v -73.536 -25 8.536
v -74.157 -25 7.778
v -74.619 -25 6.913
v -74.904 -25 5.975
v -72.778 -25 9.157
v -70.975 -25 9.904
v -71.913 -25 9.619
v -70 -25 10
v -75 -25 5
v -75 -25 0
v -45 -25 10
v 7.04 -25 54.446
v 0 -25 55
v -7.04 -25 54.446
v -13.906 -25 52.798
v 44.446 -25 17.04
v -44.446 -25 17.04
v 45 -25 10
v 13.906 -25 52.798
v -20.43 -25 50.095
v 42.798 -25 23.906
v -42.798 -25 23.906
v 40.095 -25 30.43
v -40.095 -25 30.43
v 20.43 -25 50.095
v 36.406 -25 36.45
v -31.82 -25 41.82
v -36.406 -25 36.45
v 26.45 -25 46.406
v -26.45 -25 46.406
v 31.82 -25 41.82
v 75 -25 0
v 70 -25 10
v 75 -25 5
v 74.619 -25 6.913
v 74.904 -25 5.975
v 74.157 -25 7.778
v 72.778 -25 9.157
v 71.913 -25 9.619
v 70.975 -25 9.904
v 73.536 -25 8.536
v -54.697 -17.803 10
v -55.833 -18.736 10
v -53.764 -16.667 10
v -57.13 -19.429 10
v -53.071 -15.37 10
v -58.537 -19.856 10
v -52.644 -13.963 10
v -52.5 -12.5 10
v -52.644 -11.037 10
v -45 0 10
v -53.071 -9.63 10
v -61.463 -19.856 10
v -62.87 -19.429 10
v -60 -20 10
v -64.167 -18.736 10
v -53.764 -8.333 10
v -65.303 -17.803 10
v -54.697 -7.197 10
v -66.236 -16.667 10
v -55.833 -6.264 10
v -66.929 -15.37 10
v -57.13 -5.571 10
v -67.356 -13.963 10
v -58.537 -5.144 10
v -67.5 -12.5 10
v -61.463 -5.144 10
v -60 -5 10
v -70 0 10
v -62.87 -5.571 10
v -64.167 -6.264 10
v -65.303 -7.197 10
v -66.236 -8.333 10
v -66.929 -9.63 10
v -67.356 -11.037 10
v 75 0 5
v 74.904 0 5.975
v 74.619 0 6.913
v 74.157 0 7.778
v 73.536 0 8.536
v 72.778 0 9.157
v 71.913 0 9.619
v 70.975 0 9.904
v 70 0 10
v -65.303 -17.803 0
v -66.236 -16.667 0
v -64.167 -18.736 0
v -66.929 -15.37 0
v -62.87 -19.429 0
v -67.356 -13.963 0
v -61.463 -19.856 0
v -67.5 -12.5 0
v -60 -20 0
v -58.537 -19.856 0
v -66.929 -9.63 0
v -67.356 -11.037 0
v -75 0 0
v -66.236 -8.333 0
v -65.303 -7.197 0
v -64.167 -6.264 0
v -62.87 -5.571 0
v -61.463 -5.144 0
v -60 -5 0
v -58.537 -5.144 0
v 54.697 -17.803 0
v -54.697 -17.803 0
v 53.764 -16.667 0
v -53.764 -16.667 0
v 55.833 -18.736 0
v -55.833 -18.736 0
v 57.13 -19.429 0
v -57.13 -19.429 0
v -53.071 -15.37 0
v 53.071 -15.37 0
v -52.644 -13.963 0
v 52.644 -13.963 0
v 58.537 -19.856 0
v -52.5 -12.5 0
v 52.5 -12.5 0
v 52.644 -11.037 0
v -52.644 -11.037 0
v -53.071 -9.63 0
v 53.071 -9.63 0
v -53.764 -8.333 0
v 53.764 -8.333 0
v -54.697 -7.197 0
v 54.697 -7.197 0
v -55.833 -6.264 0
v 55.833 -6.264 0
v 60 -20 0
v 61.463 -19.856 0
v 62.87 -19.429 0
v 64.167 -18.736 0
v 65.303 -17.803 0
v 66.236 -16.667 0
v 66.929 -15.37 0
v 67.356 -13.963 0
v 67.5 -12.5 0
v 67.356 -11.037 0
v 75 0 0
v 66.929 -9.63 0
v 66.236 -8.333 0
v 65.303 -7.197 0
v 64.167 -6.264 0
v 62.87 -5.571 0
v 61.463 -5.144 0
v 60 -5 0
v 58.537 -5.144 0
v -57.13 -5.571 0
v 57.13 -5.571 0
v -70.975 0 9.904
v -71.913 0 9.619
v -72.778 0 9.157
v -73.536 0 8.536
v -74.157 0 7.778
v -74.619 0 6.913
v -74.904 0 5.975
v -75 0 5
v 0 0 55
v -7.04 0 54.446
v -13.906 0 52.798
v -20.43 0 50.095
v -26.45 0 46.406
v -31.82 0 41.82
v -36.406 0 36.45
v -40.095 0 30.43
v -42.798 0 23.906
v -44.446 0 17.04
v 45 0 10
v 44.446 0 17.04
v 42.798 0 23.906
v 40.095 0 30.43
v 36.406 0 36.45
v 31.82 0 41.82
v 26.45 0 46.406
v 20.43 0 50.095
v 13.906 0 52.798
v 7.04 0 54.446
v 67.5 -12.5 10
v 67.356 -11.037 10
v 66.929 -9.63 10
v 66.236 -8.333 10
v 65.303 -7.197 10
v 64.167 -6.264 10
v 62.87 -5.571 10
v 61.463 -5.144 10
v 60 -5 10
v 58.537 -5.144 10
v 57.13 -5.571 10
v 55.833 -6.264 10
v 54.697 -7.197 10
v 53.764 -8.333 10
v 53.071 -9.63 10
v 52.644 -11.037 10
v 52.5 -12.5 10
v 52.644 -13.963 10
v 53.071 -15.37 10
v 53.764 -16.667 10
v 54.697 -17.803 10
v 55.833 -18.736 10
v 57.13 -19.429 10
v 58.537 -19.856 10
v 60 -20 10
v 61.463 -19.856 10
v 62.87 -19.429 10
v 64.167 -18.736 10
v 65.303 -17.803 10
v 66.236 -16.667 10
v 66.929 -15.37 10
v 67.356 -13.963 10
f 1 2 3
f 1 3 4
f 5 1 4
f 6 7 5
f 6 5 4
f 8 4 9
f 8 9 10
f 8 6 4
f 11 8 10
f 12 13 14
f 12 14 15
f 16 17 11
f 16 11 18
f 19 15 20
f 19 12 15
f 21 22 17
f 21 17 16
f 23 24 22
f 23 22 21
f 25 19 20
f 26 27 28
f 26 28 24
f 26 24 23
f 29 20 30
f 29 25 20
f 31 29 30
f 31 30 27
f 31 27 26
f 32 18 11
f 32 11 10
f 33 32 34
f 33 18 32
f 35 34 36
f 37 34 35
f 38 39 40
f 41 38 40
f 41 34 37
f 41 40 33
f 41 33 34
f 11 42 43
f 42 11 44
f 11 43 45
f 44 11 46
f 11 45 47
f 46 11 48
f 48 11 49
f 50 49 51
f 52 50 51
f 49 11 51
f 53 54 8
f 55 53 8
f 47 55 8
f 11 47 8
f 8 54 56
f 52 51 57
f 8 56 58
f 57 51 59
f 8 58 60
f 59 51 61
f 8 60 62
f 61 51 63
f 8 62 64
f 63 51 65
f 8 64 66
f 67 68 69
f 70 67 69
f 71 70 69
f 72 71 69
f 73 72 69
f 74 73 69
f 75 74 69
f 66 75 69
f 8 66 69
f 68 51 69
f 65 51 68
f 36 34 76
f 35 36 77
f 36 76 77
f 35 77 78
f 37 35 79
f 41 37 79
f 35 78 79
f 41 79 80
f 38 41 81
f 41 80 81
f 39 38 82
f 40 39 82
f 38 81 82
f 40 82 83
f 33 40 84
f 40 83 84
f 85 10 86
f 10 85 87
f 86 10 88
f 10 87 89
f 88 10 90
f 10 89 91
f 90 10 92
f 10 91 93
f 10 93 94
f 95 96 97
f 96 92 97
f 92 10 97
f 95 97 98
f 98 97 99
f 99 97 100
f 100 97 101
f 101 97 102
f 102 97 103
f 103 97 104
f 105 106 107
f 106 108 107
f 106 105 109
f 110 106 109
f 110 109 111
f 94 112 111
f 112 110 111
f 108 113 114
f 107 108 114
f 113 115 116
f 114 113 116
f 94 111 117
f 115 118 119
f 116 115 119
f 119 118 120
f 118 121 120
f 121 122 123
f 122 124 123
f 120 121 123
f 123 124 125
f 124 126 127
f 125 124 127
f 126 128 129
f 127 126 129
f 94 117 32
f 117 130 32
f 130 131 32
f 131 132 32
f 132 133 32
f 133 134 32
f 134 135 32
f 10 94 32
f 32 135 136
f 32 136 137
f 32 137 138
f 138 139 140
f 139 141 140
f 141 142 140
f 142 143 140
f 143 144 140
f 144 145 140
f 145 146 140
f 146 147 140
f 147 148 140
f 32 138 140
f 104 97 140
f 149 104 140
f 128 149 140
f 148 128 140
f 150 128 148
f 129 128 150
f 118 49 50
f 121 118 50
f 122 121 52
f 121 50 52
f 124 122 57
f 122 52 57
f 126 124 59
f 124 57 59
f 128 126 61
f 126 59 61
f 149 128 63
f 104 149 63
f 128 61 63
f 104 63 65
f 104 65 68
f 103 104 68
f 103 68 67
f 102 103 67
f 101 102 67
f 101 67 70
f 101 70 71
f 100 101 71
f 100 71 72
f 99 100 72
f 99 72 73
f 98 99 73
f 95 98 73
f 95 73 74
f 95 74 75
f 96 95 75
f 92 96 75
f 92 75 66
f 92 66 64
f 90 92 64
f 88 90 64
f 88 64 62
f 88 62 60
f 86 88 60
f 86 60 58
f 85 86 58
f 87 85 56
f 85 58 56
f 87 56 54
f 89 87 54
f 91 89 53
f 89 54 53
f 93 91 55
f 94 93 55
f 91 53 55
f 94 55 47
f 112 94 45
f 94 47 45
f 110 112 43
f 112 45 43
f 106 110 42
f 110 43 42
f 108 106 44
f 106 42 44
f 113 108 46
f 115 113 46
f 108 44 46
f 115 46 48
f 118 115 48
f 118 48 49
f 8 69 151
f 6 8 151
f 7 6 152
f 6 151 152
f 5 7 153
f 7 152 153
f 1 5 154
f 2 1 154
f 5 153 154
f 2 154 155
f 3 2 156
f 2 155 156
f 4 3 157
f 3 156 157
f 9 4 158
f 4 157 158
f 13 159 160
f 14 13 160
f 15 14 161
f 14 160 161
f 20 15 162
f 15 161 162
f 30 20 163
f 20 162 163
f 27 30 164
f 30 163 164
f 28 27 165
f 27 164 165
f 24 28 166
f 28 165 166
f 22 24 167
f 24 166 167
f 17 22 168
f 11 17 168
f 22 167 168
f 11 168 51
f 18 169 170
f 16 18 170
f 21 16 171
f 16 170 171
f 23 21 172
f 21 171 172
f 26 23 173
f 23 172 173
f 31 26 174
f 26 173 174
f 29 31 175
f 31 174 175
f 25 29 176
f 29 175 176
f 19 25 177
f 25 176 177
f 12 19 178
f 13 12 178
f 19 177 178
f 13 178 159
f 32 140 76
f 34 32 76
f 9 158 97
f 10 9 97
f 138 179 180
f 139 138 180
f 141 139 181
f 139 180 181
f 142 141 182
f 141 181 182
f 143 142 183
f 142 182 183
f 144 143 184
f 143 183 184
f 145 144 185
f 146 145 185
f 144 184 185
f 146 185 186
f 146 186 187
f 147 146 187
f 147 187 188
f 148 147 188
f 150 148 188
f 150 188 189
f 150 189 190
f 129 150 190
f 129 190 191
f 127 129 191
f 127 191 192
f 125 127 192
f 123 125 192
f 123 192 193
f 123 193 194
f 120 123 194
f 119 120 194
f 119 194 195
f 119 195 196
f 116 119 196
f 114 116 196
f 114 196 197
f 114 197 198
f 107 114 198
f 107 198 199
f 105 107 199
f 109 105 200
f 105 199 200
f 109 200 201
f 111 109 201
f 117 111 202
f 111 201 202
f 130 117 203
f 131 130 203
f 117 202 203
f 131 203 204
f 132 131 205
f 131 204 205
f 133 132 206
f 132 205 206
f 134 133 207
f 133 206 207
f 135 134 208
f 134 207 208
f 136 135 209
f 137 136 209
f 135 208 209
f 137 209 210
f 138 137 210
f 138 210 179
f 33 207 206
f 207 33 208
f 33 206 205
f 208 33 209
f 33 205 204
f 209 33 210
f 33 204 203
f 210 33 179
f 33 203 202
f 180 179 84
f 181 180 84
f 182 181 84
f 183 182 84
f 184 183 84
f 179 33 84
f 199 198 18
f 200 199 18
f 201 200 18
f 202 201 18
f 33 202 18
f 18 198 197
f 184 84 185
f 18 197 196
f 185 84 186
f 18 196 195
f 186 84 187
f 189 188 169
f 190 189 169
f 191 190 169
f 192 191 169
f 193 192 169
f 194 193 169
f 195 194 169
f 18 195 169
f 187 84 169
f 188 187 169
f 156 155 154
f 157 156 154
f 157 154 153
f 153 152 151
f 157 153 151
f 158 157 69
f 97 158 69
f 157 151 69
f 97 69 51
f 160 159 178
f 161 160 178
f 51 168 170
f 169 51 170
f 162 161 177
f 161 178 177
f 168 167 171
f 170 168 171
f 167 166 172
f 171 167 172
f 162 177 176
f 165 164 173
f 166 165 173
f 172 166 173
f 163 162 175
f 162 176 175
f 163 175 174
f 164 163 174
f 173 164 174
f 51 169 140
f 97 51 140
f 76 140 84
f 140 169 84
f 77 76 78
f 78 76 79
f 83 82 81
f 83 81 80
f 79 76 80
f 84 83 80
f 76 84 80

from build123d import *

# Parameters (mm, degrees)
F1_DEPTH = 25
F2_R     = 7.5
F3_DEPTH = 10.001


with BuildPart() as f1:
    # F0 (on Front) → F1 (new body)
    with BuildSketch(Plane.XZ):
        with BuildLine():
            Line((-45, 10), (-45, 0))
            Line((-45, 0), (45, 0))
            Line((45, 0), (45, 10))
            ThreePointArc((45, 10), (31.819805, 41.819805), (0, 55))
            ThreePointArc((0, 55), (-31.819805, 41.819805), (-45, 10))
        make_face()
        with BuildLine():
            Line((-75, 5), (-75, 0))
            Line((-75, 0), (-45, 0))
            Line((-45, 0), (-45, 10))
            Line((-45, 10), (-70, 10))
            ThreePointArc((-70, 10), (-73.535534, 8.535534), (-75, 5))
        make_face()
        with BuildLine():
            Line((45, 10), (45, 0))
            Line((45, 0), (75, 0))
            Line((75, 0), (75, 5))
            ThreePointArc((75, 5), (73.535534, 8.535534), (70, 10))
            Line((70, 10), (45, 10))
        make_face()
    extrude(amount=F1_DEPTH)

    # F2 (on face) → F3 (cut, through all)
    with BuildSketch(Plane.XY.offset(10)):
        with Locations((-60, -12.5)):
            Circle(F2_R)
        with Locations((60, -12.5)):
            Circle(F2_R)
    extrude(amount=-F3_DEPTH, mode=Mode.SUBTRACT)


solid = f1.part
